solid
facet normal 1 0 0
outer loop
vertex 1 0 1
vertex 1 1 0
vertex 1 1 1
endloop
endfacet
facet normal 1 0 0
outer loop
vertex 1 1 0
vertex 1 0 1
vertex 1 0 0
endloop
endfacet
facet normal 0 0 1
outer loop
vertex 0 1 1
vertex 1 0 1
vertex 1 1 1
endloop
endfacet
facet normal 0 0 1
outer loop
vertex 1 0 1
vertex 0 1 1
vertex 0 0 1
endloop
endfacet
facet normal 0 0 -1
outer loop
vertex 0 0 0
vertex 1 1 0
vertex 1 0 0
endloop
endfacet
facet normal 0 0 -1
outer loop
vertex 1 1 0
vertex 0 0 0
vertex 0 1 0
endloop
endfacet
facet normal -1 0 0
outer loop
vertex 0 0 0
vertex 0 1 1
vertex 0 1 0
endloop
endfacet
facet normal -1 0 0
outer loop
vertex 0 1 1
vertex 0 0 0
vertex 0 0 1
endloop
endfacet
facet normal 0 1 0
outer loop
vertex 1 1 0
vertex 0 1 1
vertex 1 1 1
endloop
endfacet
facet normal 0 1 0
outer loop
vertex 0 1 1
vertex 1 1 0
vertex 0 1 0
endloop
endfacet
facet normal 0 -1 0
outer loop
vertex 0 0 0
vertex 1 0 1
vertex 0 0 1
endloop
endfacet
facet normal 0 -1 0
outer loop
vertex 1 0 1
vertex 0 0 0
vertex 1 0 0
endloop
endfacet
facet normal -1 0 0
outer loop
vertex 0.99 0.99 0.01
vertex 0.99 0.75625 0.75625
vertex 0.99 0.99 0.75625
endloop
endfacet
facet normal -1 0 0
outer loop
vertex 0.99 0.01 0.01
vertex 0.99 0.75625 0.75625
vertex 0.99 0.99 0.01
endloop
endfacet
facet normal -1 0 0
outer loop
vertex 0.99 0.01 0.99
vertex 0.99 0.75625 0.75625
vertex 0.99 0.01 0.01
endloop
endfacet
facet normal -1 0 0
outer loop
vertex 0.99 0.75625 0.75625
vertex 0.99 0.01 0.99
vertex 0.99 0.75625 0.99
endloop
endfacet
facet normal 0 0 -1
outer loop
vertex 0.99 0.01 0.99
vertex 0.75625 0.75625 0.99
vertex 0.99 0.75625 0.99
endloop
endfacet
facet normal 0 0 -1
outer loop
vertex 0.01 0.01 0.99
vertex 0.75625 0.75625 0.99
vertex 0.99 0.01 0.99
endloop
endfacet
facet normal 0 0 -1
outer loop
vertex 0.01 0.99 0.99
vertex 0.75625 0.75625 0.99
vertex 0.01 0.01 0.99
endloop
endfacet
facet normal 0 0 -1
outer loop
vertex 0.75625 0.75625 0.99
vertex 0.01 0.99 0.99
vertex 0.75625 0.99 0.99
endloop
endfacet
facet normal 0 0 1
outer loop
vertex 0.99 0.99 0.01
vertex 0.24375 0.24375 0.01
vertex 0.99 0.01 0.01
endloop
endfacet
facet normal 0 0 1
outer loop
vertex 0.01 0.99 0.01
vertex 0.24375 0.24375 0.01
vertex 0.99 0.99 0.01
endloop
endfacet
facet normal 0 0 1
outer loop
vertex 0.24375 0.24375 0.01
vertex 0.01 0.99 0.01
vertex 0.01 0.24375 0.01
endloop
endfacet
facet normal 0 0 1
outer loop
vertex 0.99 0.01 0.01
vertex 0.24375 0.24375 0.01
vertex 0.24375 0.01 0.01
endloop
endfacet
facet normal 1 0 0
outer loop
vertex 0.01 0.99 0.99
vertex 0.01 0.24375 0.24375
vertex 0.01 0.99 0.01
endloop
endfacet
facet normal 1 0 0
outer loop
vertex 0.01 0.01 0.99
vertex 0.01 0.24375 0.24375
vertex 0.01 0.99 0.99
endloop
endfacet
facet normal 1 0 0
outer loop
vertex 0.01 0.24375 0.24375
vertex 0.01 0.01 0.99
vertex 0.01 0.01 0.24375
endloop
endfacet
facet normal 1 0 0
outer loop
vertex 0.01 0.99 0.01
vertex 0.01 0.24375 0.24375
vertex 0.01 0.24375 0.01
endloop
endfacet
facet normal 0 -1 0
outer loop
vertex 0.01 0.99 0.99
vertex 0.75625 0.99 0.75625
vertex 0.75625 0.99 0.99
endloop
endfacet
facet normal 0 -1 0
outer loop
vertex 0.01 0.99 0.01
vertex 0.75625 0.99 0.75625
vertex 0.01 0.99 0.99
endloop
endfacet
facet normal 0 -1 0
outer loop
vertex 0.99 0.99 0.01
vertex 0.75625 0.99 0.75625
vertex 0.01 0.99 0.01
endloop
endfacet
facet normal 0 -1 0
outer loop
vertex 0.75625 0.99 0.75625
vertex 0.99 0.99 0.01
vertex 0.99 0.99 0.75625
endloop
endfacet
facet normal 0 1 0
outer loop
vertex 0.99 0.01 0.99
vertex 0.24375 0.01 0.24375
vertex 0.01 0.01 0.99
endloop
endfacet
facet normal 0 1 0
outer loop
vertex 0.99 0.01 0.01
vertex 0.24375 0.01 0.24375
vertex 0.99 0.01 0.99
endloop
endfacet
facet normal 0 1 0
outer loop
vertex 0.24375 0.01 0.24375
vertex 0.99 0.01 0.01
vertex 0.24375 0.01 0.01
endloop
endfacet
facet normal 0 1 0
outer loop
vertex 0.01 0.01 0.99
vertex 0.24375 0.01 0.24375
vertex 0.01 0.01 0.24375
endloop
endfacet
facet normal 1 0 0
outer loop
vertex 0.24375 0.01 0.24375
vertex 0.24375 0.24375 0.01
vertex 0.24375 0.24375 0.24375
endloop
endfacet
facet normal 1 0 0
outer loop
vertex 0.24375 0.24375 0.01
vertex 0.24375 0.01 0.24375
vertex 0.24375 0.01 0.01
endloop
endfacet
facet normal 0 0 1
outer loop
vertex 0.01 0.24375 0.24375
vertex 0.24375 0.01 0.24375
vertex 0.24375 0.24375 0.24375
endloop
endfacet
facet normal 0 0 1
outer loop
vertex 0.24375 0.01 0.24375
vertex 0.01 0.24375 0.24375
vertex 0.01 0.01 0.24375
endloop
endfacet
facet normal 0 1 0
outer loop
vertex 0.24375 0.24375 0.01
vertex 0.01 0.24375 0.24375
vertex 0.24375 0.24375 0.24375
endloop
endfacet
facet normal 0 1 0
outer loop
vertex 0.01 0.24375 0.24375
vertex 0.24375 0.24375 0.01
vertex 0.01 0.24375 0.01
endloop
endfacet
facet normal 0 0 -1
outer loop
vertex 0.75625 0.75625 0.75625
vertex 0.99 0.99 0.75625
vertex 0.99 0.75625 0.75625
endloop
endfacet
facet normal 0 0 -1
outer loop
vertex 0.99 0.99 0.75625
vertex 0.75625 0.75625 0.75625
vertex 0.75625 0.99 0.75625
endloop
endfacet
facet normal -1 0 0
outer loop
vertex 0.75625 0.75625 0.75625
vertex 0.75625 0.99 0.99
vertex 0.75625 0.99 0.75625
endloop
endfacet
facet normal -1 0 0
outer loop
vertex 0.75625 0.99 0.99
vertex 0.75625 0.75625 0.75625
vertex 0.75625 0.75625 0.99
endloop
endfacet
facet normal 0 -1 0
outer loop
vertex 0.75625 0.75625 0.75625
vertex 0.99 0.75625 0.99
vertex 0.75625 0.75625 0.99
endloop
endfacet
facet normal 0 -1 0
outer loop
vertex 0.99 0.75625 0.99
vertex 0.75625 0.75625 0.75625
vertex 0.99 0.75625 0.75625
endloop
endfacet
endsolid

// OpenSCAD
translate([0.125, 0.125, 0.125]) color([0.41670532407941085, 0.425345680111462, 0.7907863107789563]) cube([0.2375, 0.2375, 0.2375], center=true);
translate([0.875, 0.875, 0.875]) color([0.6126428856407916, 0.2737647079796258, 0.693344578621807]) cube([0.2375, 0.2375, 0.2375], center=true);
color([0.3,0.3,0.3,0.3]) difference() { cube([1,1,1]); translate([0.01,0.01,0.01]) cube([0.98,0.98,0.98]); }
